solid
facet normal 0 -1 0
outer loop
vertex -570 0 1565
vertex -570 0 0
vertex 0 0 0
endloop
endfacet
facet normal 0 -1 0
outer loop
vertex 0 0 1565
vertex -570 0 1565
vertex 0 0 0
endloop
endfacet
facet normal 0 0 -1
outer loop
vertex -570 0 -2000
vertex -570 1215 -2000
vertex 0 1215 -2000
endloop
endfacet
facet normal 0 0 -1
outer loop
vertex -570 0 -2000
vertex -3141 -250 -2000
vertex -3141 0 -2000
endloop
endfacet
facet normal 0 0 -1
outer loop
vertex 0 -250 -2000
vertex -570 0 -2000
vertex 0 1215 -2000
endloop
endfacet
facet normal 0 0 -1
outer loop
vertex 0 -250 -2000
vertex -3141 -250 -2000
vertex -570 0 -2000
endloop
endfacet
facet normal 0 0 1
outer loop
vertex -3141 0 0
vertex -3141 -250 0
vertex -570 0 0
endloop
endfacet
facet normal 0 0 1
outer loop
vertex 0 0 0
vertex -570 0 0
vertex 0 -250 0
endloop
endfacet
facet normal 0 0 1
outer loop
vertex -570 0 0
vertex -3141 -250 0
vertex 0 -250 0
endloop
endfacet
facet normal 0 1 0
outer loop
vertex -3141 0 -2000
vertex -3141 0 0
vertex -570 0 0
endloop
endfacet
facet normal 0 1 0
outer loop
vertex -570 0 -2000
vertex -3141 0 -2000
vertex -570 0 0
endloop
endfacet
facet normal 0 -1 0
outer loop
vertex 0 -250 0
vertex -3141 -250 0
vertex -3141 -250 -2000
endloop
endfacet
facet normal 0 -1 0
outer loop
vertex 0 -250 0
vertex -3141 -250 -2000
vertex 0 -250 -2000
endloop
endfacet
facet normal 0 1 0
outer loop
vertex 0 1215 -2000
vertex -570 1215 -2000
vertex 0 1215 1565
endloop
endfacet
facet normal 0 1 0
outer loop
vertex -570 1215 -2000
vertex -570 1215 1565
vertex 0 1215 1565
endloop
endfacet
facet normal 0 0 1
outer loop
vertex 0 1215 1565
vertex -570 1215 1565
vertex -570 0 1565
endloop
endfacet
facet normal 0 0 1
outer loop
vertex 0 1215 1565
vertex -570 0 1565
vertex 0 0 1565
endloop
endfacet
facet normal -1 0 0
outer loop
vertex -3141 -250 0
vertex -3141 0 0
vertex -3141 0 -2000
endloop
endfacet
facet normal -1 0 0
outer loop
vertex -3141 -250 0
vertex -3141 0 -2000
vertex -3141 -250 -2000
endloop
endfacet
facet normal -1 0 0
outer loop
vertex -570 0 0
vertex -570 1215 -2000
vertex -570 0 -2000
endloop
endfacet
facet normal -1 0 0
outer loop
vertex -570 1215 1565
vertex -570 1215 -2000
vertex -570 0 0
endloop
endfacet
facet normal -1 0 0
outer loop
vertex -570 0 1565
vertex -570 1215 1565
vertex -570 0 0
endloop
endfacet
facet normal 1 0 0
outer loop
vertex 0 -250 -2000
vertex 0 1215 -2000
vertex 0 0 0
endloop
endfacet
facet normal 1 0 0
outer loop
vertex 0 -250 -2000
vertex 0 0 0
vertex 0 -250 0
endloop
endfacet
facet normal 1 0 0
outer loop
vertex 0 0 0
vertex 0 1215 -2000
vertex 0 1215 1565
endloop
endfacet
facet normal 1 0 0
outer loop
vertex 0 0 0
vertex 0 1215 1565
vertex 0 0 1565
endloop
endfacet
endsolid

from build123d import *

# Parameters (mm, degrees)
F4_W     = 570
F4_H     = 1215
F5_DEPTH = 1565
F1_E1_W  = 3141
F1_E1_H  = 250
F6_DEPTH = 2000
F7_DEPTH = 2000


# Not quite as in the source:
# - an extrude ends at something that could not be found from the text; its depth is read off the source's solid
# - the program builds the solid bodies; features that only make, move or delete a surface that nothing else refers to are left out


with BuildPart() as f5:
    # F4 (on face) → F5 (new body)
    with BuildSketch(Plane(origin=(0, 0, 0), x_dir=(1, 0, 0), z_dir=(0, 0, -1))):
        with Locations((-285, -607.5)):
            Rectangle(F4_W, F4_H)
    extrude(amount=-F5_DEPTH)

    # F1_E1 (on explicit) → F6 (join)
    with BuildSketch(Plane(origin=(-3141, 0, 0), x_dir=(1, 0, 0), z_dir=(0, 0, -1))):
        with Locations((1570.5, 125)):
            Rectangle(F1_E1_W, F1_E1_H)
    extrude(amount=F6_DEPTH)

    # F7 (add, through all): a face of the model
    f7_faces = [f5.faces().sort_by_distance(p)[0] for p in [
        (-285, 607.5, 0),
    ]]
    extrude(f7_faces, amount=F7_DEPTH)


solid = f5.part
